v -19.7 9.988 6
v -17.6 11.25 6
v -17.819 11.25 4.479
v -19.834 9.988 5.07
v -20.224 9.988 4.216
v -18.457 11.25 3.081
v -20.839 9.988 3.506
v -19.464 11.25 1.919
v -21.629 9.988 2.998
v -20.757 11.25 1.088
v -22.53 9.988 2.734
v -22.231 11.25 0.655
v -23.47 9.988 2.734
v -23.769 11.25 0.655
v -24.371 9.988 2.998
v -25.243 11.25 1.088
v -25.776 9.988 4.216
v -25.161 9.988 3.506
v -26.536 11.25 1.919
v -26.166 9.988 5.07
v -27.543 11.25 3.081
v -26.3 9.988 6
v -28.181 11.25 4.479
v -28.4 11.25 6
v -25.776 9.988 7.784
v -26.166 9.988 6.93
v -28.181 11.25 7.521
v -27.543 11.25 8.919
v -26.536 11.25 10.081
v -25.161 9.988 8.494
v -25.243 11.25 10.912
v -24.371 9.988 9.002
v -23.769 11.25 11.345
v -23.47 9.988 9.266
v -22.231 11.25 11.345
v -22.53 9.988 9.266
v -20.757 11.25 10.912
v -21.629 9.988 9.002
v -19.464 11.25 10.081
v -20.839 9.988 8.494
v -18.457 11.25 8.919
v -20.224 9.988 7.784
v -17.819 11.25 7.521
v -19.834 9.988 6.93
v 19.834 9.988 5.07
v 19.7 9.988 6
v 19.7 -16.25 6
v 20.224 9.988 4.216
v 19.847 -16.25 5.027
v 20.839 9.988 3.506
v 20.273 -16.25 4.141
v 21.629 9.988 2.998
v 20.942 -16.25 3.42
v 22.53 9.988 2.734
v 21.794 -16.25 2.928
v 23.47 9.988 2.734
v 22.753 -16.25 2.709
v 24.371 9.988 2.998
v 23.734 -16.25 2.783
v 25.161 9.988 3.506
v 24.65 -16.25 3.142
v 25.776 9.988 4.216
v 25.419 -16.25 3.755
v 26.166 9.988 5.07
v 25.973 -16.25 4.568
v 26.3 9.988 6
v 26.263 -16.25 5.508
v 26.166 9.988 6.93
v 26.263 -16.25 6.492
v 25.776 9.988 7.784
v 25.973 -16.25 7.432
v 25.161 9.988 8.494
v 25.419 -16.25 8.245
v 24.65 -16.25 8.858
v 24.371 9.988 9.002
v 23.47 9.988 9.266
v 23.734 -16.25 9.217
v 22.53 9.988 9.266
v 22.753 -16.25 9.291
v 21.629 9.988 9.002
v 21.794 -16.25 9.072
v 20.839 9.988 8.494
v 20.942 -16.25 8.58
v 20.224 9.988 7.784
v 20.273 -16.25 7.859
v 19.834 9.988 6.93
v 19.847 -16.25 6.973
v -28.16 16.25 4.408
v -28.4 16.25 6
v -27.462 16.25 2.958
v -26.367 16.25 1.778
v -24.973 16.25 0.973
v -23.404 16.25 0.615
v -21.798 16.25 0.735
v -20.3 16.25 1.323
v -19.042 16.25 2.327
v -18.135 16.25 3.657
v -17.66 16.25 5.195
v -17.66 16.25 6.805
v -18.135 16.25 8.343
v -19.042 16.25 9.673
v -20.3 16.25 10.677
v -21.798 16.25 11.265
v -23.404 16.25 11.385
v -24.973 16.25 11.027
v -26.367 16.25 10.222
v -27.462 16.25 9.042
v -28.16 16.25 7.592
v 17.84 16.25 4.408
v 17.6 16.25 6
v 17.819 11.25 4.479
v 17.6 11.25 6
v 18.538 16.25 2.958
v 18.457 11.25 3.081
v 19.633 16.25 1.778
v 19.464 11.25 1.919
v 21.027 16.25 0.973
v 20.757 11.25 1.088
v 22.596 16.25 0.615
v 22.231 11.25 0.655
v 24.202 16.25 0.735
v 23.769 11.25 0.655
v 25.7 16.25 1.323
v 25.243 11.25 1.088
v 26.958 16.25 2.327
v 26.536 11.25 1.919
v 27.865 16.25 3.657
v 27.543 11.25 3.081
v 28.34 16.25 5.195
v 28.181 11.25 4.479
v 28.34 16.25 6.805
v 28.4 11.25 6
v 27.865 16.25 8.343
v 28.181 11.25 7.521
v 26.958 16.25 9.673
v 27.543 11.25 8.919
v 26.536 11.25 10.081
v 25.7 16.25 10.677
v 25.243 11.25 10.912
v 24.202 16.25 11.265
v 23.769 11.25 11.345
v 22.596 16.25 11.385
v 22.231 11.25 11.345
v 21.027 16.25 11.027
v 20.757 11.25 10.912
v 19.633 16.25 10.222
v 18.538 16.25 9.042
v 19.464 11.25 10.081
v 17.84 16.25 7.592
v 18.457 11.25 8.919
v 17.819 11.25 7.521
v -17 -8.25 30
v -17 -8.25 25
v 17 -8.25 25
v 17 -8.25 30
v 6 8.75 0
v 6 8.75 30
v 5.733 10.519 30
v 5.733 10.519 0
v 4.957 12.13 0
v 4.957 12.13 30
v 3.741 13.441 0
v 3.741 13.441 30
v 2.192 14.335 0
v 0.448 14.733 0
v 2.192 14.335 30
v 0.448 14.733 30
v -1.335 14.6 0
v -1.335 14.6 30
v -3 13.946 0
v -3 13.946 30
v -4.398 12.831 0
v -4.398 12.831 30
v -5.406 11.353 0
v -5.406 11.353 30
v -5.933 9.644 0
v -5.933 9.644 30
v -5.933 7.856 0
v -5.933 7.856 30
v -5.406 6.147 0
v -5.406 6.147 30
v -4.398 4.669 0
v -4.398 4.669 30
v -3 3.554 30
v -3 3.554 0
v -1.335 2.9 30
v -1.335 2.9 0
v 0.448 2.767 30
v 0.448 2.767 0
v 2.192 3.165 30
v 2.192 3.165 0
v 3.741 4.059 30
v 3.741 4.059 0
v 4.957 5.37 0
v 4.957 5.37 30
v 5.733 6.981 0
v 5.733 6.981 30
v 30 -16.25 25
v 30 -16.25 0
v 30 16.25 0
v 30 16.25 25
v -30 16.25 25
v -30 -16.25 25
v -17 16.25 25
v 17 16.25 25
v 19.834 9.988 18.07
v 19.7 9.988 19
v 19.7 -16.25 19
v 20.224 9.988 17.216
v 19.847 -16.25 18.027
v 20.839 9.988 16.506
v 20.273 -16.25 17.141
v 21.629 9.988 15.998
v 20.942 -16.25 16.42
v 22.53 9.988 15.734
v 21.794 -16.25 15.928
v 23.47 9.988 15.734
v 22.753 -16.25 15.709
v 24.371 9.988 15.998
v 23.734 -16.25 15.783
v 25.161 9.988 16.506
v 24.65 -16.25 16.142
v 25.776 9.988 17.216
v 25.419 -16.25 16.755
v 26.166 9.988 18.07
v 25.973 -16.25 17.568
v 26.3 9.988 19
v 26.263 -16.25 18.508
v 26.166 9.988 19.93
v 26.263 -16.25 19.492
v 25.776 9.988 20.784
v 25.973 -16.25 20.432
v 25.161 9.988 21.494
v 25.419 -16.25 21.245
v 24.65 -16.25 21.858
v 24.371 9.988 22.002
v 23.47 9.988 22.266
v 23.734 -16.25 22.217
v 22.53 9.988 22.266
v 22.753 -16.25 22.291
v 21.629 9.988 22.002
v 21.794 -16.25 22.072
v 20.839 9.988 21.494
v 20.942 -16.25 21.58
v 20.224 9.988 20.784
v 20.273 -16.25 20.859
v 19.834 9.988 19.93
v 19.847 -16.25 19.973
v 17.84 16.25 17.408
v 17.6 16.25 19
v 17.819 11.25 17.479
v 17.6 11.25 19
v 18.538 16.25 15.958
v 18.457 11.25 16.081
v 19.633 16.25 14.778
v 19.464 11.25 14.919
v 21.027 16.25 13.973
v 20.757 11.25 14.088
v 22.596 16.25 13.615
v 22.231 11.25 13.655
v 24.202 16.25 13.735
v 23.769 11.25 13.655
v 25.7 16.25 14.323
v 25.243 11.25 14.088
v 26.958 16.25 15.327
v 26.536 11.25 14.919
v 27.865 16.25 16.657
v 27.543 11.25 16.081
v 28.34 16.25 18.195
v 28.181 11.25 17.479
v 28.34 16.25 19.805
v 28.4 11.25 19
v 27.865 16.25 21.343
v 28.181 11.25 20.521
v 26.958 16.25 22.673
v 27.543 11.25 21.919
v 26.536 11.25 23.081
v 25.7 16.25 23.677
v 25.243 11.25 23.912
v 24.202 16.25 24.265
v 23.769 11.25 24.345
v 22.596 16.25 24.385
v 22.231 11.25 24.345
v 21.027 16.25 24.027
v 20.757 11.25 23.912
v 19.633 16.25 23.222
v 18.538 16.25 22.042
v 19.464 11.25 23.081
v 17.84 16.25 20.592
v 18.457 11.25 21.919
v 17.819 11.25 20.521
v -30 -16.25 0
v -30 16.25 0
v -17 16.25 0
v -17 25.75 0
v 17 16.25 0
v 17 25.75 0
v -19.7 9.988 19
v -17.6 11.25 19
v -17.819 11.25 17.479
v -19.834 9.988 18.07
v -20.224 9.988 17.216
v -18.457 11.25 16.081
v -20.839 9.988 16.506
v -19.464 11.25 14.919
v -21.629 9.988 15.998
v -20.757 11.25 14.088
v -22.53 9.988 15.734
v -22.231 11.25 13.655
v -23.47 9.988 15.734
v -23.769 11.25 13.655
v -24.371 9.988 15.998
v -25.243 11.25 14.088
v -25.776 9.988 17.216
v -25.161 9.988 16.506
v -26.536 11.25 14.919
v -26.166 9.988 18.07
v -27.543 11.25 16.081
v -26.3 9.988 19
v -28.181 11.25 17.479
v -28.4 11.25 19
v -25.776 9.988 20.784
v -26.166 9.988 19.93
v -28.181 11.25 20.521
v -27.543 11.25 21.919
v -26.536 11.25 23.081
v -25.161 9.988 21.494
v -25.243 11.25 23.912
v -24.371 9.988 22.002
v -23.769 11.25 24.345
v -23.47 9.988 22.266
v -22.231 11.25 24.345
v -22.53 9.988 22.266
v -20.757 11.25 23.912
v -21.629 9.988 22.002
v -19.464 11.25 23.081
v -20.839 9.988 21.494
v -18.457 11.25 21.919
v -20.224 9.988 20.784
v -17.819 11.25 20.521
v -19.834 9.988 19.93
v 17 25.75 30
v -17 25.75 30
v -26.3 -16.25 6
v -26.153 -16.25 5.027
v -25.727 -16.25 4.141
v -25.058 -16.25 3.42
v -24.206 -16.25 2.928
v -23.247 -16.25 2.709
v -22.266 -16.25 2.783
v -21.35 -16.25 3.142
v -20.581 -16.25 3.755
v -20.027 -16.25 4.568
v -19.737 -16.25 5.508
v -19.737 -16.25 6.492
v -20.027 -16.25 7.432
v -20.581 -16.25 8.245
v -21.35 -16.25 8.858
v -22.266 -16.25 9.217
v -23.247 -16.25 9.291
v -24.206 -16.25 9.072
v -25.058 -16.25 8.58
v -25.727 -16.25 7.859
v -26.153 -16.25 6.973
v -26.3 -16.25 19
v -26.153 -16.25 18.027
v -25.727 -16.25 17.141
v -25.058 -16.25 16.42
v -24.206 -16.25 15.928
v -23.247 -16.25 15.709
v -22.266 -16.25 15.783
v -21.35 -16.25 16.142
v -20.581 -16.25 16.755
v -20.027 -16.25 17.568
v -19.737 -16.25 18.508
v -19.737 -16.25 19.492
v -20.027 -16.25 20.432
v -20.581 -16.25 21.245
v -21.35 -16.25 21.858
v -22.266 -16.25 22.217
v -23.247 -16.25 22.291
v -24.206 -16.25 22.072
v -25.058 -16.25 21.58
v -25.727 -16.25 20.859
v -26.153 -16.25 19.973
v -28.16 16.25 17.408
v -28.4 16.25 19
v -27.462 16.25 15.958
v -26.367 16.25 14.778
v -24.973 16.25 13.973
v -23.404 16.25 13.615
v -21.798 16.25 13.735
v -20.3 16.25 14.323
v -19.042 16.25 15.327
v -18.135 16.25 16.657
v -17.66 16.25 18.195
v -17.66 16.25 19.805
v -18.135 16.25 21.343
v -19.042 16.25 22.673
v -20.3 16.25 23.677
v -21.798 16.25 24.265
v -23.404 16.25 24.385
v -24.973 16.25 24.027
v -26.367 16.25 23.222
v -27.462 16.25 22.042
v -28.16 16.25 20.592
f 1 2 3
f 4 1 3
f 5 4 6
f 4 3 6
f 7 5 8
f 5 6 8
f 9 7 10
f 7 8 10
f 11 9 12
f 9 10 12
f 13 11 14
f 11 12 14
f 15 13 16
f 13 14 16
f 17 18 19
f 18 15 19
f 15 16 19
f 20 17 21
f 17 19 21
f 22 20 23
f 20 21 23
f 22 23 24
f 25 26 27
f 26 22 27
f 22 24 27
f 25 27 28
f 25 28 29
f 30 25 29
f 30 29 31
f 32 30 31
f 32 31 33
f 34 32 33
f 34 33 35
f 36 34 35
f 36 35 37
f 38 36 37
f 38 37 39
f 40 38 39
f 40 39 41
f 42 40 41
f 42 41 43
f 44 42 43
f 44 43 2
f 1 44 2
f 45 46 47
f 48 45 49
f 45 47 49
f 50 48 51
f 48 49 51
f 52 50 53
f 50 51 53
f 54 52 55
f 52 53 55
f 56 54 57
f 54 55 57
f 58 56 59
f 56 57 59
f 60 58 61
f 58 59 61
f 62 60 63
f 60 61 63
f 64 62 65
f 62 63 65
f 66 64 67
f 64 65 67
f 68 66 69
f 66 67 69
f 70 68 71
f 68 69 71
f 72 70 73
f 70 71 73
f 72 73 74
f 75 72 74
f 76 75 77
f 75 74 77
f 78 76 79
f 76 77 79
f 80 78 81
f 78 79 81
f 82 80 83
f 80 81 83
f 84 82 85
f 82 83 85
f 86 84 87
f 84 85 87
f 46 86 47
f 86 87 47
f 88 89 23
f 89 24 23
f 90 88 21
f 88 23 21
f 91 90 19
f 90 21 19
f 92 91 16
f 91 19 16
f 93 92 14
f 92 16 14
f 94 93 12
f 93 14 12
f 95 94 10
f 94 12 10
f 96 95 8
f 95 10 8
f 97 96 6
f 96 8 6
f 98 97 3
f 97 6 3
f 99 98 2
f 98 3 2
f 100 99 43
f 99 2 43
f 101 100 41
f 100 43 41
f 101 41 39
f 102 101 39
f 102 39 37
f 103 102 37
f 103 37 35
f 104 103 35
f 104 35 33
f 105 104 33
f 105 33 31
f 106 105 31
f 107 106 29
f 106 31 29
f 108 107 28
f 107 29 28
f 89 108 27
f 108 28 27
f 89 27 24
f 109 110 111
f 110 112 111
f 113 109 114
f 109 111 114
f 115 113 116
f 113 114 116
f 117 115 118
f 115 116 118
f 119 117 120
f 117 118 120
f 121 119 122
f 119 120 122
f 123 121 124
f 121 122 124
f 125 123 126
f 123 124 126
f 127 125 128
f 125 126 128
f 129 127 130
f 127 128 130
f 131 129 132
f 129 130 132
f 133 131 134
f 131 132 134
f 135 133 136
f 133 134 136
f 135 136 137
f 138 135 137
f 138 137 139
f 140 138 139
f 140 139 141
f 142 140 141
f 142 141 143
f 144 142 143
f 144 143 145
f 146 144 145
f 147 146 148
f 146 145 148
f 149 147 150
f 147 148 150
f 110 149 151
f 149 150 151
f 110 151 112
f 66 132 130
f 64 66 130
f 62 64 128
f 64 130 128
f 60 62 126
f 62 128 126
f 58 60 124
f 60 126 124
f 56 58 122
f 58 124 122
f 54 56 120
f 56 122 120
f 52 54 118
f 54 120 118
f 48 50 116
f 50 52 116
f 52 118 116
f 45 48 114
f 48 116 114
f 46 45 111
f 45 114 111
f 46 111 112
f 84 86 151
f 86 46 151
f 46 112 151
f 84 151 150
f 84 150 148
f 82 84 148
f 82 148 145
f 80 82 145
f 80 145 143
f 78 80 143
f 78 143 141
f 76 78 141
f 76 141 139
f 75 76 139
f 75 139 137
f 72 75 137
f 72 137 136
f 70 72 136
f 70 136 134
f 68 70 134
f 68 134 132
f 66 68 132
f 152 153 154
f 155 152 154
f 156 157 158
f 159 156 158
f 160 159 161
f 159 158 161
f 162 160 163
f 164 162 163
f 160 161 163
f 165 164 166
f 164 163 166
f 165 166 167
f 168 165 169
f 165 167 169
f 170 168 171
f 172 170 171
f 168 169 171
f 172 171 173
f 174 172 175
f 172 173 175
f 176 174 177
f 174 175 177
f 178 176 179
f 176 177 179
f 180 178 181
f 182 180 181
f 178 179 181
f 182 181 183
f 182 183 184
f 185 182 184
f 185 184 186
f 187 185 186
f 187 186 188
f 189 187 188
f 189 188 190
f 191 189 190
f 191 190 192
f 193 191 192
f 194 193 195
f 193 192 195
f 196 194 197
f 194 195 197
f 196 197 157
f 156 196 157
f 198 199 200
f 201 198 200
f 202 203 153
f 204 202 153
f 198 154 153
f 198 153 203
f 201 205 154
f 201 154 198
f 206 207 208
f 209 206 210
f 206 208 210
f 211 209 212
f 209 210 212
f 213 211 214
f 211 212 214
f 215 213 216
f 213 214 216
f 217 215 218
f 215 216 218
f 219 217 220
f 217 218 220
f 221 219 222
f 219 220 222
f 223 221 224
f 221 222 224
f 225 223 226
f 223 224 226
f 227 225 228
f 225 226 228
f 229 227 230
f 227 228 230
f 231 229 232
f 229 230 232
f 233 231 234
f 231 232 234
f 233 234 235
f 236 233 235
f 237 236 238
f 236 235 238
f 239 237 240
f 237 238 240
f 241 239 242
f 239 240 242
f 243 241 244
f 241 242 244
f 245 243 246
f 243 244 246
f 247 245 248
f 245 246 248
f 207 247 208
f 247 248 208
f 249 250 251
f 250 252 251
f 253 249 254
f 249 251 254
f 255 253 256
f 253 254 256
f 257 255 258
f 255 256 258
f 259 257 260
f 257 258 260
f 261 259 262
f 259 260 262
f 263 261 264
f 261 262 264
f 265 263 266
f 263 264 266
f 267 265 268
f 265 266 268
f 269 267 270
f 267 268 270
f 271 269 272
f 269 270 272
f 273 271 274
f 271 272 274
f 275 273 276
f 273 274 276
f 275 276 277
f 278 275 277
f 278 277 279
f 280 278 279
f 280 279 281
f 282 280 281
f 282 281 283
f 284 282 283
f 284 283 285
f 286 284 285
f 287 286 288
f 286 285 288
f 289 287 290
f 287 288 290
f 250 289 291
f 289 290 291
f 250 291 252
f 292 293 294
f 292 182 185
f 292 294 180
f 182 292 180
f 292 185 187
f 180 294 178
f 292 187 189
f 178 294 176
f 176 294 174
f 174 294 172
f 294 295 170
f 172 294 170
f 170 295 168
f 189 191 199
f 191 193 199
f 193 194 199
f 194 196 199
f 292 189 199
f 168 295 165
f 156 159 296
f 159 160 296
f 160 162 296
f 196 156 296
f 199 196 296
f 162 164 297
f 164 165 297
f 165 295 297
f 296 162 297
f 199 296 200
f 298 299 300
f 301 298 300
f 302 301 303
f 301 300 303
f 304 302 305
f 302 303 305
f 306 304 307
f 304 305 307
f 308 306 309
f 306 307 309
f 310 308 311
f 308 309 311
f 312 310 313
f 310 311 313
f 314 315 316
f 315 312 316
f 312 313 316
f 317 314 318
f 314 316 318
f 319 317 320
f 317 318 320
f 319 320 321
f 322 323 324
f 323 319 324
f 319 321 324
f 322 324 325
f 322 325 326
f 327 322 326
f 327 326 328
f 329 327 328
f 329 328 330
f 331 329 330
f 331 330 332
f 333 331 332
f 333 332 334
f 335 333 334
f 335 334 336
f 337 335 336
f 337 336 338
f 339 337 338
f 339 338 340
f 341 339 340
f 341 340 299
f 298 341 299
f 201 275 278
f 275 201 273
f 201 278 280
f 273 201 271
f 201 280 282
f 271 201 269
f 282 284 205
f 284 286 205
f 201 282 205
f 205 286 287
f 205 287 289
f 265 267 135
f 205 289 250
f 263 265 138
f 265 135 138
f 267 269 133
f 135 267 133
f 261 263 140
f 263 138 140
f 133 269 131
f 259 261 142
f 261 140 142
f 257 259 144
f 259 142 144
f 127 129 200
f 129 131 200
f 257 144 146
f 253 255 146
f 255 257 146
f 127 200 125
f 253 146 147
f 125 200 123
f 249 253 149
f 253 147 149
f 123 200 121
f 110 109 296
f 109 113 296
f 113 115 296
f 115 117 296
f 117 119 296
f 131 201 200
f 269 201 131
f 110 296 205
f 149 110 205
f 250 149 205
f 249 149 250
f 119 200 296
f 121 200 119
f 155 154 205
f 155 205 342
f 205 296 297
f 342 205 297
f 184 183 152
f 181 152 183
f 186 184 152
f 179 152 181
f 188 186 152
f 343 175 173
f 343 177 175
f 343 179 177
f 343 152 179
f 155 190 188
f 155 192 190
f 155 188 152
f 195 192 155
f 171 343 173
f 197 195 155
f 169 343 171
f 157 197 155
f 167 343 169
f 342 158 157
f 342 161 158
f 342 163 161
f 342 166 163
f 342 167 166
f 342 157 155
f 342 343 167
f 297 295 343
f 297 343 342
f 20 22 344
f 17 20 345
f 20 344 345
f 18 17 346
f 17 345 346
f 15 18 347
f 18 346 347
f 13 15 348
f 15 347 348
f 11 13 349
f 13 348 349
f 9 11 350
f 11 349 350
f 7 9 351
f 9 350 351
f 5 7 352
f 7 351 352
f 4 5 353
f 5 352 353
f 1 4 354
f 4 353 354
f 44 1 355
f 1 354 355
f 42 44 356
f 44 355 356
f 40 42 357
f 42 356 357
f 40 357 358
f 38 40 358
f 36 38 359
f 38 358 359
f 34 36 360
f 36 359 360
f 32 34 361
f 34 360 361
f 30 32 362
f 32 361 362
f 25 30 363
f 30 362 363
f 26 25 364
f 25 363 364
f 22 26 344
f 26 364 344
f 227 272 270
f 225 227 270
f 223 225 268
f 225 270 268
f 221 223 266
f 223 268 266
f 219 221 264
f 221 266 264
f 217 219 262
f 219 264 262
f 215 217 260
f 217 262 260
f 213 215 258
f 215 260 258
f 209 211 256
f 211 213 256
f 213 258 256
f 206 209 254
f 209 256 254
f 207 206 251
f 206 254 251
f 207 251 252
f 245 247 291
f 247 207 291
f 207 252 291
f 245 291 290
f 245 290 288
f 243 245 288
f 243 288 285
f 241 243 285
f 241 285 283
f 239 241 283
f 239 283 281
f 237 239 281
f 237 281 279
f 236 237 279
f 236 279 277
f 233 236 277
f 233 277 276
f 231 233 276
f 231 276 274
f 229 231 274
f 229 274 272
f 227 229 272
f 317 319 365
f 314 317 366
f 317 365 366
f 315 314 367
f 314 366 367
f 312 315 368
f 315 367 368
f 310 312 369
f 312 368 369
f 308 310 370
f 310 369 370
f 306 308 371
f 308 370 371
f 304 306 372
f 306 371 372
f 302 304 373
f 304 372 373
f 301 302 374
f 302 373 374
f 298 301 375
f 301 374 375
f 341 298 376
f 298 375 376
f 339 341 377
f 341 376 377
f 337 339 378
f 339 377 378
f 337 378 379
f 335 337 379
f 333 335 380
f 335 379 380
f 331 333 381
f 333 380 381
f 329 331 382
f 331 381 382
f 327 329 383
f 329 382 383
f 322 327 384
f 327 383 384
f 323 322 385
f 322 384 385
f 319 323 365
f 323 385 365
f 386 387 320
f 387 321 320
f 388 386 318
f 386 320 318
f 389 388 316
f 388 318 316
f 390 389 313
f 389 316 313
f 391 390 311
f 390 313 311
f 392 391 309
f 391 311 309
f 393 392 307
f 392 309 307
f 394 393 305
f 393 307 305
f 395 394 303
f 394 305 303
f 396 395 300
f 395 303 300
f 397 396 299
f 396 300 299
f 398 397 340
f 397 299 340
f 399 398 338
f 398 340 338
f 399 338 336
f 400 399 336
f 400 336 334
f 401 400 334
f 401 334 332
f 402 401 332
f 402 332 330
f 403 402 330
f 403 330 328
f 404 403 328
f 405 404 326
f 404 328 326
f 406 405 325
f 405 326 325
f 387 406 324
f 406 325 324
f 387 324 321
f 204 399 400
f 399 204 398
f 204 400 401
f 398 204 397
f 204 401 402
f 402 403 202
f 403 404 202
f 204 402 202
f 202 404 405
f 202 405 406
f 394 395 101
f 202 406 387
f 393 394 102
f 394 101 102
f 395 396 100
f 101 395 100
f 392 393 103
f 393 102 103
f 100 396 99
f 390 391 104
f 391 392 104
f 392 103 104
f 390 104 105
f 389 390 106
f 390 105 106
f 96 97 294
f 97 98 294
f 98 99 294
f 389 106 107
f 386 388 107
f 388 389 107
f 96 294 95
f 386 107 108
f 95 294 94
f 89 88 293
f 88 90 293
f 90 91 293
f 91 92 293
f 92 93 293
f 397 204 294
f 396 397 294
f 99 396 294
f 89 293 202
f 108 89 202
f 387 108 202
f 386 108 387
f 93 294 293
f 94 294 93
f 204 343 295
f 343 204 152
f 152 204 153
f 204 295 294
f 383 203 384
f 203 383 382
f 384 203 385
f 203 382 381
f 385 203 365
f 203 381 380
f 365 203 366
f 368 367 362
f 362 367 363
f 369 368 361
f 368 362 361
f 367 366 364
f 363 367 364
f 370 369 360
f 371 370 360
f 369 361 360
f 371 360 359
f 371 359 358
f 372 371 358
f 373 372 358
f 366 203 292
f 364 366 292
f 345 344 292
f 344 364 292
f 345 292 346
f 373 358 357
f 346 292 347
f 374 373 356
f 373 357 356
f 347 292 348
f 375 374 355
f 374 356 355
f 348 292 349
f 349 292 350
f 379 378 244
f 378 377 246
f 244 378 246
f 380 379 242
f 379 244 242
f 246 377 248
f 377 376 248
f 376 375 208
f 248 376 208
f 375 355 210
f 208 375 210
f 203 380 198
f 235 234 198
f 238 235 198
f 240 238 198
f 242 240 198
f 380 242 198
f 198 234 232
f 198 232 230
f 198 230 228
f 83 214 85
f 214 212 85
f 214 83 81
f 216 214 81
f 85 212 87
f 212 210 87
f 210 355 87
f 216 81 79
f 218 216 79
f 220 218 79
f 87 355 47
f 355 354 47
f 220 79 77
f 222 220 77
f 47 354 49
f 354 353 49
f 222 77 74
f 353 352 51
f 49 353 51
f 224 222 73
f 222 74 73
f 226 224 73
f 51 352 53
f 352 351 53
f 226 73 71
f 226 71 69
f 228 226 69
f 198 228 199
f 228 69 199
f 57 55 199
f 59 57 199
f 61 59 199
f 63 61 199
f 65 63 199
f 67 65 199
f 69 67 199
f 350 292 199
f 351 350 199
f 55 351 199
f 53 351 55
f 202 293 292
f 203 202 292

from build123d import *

# Parameters (mm, degrees)
BOSS_EXTRUDE1_DEPTH              = 25
SKETCH1_3_W                      = 34
SKETCH1_3_H                      = 34
BOSS_EXTRUDE2_DEPTH              = 30
F_6_6_6_6_DIAMETER_HOLE1_D       = 6.6
SKETCH4_R                        = 6
CUT_EXTRUDE1_DEPTH               = 30
F_10_8_10_8_DIAMETER_HOLE1_D     = 10.8
F_10_8_10_8_DIAMETER_HOLE1_DEPTH = 5
F_10_8_10_8_DIAMETER_HOLE1_TIP   = 3.244647343


with BuildPart() as part:
    # Sketch1 → Boss-Extrude1 (new body)
    with BuildSketch(Plane.XY):
        Polygon((-17, 16.25), (-30, 16.25), (-30, -16.25), (30, -16.25), (30, 16.25), (17, 16.25), (17, -8.25), (-17, -8.25), align=None)
    extrude(amount=BOSS_EXTRUDE1_DEPTH)

    # Sketch1<3> → Boss-Extrude2 (add)
    with BuildSketch(Plane.XY):
        with Locations((0, 8.75)):
            Rectangle(SKETCH1_3_W, SKETCH1_3_H)
    extrude(amount=BOSS_EXTRUDE2_DEPTH)

    # Ø6.6 (6.6) Diameter Hole1 (through all)
    with Locations(Plane(origin=(0, 16.25, 0), x_dir=(1, 0, 0), z_dir=(0, 1, 0))):
        with Locations((-23, -19), (-23, -6), (23, -6), (23, -19)):
            Hole(F_6_6_6_6_DIAMETER_HOLE1_D / 2)

    # Sketch4 → Cut-Extrude1 (cut)
    with BuildSketch(Plane.XY.offset(30)):
        with Locations((0, 8.75)):
            Circle(SKETCH4_R)
    extrude(amount=-CUT_EXTRUDE1_DEPTH, mode=Mode.SUBTRACT)

    # Ø10.8 (10.8) Diameter Hole1
    with Locations(Plane(origin=(0, 16.25, 0), x_dir=(1, 0, 0), z_dir=(0, 1, 0))):
        with Locations((-23, -19), (-23, -6), (23, -6), (23, -19)):
            Hole(F_10_8_10_8_DIAMETER_HOLE1_D / 2, depth=F_10_8_10_8_DIAMETER_HOLE1_DEPTH)
            with Locations((0, 0, -(F_10_8_10_8_DIAMETER_HOLE1_DEPTH + F_10_8_10_8_DIAMETER_HOLE1_TIP / 2))):  # 118° drill point
                Cone(0, F_10_8_10_8_DIAMETER_HOLE1_D / 2, F_10_8_10_8_DIAMETER_HOLE1_TIP, mode=Mode.SUBTRACT)


solid = part.part
